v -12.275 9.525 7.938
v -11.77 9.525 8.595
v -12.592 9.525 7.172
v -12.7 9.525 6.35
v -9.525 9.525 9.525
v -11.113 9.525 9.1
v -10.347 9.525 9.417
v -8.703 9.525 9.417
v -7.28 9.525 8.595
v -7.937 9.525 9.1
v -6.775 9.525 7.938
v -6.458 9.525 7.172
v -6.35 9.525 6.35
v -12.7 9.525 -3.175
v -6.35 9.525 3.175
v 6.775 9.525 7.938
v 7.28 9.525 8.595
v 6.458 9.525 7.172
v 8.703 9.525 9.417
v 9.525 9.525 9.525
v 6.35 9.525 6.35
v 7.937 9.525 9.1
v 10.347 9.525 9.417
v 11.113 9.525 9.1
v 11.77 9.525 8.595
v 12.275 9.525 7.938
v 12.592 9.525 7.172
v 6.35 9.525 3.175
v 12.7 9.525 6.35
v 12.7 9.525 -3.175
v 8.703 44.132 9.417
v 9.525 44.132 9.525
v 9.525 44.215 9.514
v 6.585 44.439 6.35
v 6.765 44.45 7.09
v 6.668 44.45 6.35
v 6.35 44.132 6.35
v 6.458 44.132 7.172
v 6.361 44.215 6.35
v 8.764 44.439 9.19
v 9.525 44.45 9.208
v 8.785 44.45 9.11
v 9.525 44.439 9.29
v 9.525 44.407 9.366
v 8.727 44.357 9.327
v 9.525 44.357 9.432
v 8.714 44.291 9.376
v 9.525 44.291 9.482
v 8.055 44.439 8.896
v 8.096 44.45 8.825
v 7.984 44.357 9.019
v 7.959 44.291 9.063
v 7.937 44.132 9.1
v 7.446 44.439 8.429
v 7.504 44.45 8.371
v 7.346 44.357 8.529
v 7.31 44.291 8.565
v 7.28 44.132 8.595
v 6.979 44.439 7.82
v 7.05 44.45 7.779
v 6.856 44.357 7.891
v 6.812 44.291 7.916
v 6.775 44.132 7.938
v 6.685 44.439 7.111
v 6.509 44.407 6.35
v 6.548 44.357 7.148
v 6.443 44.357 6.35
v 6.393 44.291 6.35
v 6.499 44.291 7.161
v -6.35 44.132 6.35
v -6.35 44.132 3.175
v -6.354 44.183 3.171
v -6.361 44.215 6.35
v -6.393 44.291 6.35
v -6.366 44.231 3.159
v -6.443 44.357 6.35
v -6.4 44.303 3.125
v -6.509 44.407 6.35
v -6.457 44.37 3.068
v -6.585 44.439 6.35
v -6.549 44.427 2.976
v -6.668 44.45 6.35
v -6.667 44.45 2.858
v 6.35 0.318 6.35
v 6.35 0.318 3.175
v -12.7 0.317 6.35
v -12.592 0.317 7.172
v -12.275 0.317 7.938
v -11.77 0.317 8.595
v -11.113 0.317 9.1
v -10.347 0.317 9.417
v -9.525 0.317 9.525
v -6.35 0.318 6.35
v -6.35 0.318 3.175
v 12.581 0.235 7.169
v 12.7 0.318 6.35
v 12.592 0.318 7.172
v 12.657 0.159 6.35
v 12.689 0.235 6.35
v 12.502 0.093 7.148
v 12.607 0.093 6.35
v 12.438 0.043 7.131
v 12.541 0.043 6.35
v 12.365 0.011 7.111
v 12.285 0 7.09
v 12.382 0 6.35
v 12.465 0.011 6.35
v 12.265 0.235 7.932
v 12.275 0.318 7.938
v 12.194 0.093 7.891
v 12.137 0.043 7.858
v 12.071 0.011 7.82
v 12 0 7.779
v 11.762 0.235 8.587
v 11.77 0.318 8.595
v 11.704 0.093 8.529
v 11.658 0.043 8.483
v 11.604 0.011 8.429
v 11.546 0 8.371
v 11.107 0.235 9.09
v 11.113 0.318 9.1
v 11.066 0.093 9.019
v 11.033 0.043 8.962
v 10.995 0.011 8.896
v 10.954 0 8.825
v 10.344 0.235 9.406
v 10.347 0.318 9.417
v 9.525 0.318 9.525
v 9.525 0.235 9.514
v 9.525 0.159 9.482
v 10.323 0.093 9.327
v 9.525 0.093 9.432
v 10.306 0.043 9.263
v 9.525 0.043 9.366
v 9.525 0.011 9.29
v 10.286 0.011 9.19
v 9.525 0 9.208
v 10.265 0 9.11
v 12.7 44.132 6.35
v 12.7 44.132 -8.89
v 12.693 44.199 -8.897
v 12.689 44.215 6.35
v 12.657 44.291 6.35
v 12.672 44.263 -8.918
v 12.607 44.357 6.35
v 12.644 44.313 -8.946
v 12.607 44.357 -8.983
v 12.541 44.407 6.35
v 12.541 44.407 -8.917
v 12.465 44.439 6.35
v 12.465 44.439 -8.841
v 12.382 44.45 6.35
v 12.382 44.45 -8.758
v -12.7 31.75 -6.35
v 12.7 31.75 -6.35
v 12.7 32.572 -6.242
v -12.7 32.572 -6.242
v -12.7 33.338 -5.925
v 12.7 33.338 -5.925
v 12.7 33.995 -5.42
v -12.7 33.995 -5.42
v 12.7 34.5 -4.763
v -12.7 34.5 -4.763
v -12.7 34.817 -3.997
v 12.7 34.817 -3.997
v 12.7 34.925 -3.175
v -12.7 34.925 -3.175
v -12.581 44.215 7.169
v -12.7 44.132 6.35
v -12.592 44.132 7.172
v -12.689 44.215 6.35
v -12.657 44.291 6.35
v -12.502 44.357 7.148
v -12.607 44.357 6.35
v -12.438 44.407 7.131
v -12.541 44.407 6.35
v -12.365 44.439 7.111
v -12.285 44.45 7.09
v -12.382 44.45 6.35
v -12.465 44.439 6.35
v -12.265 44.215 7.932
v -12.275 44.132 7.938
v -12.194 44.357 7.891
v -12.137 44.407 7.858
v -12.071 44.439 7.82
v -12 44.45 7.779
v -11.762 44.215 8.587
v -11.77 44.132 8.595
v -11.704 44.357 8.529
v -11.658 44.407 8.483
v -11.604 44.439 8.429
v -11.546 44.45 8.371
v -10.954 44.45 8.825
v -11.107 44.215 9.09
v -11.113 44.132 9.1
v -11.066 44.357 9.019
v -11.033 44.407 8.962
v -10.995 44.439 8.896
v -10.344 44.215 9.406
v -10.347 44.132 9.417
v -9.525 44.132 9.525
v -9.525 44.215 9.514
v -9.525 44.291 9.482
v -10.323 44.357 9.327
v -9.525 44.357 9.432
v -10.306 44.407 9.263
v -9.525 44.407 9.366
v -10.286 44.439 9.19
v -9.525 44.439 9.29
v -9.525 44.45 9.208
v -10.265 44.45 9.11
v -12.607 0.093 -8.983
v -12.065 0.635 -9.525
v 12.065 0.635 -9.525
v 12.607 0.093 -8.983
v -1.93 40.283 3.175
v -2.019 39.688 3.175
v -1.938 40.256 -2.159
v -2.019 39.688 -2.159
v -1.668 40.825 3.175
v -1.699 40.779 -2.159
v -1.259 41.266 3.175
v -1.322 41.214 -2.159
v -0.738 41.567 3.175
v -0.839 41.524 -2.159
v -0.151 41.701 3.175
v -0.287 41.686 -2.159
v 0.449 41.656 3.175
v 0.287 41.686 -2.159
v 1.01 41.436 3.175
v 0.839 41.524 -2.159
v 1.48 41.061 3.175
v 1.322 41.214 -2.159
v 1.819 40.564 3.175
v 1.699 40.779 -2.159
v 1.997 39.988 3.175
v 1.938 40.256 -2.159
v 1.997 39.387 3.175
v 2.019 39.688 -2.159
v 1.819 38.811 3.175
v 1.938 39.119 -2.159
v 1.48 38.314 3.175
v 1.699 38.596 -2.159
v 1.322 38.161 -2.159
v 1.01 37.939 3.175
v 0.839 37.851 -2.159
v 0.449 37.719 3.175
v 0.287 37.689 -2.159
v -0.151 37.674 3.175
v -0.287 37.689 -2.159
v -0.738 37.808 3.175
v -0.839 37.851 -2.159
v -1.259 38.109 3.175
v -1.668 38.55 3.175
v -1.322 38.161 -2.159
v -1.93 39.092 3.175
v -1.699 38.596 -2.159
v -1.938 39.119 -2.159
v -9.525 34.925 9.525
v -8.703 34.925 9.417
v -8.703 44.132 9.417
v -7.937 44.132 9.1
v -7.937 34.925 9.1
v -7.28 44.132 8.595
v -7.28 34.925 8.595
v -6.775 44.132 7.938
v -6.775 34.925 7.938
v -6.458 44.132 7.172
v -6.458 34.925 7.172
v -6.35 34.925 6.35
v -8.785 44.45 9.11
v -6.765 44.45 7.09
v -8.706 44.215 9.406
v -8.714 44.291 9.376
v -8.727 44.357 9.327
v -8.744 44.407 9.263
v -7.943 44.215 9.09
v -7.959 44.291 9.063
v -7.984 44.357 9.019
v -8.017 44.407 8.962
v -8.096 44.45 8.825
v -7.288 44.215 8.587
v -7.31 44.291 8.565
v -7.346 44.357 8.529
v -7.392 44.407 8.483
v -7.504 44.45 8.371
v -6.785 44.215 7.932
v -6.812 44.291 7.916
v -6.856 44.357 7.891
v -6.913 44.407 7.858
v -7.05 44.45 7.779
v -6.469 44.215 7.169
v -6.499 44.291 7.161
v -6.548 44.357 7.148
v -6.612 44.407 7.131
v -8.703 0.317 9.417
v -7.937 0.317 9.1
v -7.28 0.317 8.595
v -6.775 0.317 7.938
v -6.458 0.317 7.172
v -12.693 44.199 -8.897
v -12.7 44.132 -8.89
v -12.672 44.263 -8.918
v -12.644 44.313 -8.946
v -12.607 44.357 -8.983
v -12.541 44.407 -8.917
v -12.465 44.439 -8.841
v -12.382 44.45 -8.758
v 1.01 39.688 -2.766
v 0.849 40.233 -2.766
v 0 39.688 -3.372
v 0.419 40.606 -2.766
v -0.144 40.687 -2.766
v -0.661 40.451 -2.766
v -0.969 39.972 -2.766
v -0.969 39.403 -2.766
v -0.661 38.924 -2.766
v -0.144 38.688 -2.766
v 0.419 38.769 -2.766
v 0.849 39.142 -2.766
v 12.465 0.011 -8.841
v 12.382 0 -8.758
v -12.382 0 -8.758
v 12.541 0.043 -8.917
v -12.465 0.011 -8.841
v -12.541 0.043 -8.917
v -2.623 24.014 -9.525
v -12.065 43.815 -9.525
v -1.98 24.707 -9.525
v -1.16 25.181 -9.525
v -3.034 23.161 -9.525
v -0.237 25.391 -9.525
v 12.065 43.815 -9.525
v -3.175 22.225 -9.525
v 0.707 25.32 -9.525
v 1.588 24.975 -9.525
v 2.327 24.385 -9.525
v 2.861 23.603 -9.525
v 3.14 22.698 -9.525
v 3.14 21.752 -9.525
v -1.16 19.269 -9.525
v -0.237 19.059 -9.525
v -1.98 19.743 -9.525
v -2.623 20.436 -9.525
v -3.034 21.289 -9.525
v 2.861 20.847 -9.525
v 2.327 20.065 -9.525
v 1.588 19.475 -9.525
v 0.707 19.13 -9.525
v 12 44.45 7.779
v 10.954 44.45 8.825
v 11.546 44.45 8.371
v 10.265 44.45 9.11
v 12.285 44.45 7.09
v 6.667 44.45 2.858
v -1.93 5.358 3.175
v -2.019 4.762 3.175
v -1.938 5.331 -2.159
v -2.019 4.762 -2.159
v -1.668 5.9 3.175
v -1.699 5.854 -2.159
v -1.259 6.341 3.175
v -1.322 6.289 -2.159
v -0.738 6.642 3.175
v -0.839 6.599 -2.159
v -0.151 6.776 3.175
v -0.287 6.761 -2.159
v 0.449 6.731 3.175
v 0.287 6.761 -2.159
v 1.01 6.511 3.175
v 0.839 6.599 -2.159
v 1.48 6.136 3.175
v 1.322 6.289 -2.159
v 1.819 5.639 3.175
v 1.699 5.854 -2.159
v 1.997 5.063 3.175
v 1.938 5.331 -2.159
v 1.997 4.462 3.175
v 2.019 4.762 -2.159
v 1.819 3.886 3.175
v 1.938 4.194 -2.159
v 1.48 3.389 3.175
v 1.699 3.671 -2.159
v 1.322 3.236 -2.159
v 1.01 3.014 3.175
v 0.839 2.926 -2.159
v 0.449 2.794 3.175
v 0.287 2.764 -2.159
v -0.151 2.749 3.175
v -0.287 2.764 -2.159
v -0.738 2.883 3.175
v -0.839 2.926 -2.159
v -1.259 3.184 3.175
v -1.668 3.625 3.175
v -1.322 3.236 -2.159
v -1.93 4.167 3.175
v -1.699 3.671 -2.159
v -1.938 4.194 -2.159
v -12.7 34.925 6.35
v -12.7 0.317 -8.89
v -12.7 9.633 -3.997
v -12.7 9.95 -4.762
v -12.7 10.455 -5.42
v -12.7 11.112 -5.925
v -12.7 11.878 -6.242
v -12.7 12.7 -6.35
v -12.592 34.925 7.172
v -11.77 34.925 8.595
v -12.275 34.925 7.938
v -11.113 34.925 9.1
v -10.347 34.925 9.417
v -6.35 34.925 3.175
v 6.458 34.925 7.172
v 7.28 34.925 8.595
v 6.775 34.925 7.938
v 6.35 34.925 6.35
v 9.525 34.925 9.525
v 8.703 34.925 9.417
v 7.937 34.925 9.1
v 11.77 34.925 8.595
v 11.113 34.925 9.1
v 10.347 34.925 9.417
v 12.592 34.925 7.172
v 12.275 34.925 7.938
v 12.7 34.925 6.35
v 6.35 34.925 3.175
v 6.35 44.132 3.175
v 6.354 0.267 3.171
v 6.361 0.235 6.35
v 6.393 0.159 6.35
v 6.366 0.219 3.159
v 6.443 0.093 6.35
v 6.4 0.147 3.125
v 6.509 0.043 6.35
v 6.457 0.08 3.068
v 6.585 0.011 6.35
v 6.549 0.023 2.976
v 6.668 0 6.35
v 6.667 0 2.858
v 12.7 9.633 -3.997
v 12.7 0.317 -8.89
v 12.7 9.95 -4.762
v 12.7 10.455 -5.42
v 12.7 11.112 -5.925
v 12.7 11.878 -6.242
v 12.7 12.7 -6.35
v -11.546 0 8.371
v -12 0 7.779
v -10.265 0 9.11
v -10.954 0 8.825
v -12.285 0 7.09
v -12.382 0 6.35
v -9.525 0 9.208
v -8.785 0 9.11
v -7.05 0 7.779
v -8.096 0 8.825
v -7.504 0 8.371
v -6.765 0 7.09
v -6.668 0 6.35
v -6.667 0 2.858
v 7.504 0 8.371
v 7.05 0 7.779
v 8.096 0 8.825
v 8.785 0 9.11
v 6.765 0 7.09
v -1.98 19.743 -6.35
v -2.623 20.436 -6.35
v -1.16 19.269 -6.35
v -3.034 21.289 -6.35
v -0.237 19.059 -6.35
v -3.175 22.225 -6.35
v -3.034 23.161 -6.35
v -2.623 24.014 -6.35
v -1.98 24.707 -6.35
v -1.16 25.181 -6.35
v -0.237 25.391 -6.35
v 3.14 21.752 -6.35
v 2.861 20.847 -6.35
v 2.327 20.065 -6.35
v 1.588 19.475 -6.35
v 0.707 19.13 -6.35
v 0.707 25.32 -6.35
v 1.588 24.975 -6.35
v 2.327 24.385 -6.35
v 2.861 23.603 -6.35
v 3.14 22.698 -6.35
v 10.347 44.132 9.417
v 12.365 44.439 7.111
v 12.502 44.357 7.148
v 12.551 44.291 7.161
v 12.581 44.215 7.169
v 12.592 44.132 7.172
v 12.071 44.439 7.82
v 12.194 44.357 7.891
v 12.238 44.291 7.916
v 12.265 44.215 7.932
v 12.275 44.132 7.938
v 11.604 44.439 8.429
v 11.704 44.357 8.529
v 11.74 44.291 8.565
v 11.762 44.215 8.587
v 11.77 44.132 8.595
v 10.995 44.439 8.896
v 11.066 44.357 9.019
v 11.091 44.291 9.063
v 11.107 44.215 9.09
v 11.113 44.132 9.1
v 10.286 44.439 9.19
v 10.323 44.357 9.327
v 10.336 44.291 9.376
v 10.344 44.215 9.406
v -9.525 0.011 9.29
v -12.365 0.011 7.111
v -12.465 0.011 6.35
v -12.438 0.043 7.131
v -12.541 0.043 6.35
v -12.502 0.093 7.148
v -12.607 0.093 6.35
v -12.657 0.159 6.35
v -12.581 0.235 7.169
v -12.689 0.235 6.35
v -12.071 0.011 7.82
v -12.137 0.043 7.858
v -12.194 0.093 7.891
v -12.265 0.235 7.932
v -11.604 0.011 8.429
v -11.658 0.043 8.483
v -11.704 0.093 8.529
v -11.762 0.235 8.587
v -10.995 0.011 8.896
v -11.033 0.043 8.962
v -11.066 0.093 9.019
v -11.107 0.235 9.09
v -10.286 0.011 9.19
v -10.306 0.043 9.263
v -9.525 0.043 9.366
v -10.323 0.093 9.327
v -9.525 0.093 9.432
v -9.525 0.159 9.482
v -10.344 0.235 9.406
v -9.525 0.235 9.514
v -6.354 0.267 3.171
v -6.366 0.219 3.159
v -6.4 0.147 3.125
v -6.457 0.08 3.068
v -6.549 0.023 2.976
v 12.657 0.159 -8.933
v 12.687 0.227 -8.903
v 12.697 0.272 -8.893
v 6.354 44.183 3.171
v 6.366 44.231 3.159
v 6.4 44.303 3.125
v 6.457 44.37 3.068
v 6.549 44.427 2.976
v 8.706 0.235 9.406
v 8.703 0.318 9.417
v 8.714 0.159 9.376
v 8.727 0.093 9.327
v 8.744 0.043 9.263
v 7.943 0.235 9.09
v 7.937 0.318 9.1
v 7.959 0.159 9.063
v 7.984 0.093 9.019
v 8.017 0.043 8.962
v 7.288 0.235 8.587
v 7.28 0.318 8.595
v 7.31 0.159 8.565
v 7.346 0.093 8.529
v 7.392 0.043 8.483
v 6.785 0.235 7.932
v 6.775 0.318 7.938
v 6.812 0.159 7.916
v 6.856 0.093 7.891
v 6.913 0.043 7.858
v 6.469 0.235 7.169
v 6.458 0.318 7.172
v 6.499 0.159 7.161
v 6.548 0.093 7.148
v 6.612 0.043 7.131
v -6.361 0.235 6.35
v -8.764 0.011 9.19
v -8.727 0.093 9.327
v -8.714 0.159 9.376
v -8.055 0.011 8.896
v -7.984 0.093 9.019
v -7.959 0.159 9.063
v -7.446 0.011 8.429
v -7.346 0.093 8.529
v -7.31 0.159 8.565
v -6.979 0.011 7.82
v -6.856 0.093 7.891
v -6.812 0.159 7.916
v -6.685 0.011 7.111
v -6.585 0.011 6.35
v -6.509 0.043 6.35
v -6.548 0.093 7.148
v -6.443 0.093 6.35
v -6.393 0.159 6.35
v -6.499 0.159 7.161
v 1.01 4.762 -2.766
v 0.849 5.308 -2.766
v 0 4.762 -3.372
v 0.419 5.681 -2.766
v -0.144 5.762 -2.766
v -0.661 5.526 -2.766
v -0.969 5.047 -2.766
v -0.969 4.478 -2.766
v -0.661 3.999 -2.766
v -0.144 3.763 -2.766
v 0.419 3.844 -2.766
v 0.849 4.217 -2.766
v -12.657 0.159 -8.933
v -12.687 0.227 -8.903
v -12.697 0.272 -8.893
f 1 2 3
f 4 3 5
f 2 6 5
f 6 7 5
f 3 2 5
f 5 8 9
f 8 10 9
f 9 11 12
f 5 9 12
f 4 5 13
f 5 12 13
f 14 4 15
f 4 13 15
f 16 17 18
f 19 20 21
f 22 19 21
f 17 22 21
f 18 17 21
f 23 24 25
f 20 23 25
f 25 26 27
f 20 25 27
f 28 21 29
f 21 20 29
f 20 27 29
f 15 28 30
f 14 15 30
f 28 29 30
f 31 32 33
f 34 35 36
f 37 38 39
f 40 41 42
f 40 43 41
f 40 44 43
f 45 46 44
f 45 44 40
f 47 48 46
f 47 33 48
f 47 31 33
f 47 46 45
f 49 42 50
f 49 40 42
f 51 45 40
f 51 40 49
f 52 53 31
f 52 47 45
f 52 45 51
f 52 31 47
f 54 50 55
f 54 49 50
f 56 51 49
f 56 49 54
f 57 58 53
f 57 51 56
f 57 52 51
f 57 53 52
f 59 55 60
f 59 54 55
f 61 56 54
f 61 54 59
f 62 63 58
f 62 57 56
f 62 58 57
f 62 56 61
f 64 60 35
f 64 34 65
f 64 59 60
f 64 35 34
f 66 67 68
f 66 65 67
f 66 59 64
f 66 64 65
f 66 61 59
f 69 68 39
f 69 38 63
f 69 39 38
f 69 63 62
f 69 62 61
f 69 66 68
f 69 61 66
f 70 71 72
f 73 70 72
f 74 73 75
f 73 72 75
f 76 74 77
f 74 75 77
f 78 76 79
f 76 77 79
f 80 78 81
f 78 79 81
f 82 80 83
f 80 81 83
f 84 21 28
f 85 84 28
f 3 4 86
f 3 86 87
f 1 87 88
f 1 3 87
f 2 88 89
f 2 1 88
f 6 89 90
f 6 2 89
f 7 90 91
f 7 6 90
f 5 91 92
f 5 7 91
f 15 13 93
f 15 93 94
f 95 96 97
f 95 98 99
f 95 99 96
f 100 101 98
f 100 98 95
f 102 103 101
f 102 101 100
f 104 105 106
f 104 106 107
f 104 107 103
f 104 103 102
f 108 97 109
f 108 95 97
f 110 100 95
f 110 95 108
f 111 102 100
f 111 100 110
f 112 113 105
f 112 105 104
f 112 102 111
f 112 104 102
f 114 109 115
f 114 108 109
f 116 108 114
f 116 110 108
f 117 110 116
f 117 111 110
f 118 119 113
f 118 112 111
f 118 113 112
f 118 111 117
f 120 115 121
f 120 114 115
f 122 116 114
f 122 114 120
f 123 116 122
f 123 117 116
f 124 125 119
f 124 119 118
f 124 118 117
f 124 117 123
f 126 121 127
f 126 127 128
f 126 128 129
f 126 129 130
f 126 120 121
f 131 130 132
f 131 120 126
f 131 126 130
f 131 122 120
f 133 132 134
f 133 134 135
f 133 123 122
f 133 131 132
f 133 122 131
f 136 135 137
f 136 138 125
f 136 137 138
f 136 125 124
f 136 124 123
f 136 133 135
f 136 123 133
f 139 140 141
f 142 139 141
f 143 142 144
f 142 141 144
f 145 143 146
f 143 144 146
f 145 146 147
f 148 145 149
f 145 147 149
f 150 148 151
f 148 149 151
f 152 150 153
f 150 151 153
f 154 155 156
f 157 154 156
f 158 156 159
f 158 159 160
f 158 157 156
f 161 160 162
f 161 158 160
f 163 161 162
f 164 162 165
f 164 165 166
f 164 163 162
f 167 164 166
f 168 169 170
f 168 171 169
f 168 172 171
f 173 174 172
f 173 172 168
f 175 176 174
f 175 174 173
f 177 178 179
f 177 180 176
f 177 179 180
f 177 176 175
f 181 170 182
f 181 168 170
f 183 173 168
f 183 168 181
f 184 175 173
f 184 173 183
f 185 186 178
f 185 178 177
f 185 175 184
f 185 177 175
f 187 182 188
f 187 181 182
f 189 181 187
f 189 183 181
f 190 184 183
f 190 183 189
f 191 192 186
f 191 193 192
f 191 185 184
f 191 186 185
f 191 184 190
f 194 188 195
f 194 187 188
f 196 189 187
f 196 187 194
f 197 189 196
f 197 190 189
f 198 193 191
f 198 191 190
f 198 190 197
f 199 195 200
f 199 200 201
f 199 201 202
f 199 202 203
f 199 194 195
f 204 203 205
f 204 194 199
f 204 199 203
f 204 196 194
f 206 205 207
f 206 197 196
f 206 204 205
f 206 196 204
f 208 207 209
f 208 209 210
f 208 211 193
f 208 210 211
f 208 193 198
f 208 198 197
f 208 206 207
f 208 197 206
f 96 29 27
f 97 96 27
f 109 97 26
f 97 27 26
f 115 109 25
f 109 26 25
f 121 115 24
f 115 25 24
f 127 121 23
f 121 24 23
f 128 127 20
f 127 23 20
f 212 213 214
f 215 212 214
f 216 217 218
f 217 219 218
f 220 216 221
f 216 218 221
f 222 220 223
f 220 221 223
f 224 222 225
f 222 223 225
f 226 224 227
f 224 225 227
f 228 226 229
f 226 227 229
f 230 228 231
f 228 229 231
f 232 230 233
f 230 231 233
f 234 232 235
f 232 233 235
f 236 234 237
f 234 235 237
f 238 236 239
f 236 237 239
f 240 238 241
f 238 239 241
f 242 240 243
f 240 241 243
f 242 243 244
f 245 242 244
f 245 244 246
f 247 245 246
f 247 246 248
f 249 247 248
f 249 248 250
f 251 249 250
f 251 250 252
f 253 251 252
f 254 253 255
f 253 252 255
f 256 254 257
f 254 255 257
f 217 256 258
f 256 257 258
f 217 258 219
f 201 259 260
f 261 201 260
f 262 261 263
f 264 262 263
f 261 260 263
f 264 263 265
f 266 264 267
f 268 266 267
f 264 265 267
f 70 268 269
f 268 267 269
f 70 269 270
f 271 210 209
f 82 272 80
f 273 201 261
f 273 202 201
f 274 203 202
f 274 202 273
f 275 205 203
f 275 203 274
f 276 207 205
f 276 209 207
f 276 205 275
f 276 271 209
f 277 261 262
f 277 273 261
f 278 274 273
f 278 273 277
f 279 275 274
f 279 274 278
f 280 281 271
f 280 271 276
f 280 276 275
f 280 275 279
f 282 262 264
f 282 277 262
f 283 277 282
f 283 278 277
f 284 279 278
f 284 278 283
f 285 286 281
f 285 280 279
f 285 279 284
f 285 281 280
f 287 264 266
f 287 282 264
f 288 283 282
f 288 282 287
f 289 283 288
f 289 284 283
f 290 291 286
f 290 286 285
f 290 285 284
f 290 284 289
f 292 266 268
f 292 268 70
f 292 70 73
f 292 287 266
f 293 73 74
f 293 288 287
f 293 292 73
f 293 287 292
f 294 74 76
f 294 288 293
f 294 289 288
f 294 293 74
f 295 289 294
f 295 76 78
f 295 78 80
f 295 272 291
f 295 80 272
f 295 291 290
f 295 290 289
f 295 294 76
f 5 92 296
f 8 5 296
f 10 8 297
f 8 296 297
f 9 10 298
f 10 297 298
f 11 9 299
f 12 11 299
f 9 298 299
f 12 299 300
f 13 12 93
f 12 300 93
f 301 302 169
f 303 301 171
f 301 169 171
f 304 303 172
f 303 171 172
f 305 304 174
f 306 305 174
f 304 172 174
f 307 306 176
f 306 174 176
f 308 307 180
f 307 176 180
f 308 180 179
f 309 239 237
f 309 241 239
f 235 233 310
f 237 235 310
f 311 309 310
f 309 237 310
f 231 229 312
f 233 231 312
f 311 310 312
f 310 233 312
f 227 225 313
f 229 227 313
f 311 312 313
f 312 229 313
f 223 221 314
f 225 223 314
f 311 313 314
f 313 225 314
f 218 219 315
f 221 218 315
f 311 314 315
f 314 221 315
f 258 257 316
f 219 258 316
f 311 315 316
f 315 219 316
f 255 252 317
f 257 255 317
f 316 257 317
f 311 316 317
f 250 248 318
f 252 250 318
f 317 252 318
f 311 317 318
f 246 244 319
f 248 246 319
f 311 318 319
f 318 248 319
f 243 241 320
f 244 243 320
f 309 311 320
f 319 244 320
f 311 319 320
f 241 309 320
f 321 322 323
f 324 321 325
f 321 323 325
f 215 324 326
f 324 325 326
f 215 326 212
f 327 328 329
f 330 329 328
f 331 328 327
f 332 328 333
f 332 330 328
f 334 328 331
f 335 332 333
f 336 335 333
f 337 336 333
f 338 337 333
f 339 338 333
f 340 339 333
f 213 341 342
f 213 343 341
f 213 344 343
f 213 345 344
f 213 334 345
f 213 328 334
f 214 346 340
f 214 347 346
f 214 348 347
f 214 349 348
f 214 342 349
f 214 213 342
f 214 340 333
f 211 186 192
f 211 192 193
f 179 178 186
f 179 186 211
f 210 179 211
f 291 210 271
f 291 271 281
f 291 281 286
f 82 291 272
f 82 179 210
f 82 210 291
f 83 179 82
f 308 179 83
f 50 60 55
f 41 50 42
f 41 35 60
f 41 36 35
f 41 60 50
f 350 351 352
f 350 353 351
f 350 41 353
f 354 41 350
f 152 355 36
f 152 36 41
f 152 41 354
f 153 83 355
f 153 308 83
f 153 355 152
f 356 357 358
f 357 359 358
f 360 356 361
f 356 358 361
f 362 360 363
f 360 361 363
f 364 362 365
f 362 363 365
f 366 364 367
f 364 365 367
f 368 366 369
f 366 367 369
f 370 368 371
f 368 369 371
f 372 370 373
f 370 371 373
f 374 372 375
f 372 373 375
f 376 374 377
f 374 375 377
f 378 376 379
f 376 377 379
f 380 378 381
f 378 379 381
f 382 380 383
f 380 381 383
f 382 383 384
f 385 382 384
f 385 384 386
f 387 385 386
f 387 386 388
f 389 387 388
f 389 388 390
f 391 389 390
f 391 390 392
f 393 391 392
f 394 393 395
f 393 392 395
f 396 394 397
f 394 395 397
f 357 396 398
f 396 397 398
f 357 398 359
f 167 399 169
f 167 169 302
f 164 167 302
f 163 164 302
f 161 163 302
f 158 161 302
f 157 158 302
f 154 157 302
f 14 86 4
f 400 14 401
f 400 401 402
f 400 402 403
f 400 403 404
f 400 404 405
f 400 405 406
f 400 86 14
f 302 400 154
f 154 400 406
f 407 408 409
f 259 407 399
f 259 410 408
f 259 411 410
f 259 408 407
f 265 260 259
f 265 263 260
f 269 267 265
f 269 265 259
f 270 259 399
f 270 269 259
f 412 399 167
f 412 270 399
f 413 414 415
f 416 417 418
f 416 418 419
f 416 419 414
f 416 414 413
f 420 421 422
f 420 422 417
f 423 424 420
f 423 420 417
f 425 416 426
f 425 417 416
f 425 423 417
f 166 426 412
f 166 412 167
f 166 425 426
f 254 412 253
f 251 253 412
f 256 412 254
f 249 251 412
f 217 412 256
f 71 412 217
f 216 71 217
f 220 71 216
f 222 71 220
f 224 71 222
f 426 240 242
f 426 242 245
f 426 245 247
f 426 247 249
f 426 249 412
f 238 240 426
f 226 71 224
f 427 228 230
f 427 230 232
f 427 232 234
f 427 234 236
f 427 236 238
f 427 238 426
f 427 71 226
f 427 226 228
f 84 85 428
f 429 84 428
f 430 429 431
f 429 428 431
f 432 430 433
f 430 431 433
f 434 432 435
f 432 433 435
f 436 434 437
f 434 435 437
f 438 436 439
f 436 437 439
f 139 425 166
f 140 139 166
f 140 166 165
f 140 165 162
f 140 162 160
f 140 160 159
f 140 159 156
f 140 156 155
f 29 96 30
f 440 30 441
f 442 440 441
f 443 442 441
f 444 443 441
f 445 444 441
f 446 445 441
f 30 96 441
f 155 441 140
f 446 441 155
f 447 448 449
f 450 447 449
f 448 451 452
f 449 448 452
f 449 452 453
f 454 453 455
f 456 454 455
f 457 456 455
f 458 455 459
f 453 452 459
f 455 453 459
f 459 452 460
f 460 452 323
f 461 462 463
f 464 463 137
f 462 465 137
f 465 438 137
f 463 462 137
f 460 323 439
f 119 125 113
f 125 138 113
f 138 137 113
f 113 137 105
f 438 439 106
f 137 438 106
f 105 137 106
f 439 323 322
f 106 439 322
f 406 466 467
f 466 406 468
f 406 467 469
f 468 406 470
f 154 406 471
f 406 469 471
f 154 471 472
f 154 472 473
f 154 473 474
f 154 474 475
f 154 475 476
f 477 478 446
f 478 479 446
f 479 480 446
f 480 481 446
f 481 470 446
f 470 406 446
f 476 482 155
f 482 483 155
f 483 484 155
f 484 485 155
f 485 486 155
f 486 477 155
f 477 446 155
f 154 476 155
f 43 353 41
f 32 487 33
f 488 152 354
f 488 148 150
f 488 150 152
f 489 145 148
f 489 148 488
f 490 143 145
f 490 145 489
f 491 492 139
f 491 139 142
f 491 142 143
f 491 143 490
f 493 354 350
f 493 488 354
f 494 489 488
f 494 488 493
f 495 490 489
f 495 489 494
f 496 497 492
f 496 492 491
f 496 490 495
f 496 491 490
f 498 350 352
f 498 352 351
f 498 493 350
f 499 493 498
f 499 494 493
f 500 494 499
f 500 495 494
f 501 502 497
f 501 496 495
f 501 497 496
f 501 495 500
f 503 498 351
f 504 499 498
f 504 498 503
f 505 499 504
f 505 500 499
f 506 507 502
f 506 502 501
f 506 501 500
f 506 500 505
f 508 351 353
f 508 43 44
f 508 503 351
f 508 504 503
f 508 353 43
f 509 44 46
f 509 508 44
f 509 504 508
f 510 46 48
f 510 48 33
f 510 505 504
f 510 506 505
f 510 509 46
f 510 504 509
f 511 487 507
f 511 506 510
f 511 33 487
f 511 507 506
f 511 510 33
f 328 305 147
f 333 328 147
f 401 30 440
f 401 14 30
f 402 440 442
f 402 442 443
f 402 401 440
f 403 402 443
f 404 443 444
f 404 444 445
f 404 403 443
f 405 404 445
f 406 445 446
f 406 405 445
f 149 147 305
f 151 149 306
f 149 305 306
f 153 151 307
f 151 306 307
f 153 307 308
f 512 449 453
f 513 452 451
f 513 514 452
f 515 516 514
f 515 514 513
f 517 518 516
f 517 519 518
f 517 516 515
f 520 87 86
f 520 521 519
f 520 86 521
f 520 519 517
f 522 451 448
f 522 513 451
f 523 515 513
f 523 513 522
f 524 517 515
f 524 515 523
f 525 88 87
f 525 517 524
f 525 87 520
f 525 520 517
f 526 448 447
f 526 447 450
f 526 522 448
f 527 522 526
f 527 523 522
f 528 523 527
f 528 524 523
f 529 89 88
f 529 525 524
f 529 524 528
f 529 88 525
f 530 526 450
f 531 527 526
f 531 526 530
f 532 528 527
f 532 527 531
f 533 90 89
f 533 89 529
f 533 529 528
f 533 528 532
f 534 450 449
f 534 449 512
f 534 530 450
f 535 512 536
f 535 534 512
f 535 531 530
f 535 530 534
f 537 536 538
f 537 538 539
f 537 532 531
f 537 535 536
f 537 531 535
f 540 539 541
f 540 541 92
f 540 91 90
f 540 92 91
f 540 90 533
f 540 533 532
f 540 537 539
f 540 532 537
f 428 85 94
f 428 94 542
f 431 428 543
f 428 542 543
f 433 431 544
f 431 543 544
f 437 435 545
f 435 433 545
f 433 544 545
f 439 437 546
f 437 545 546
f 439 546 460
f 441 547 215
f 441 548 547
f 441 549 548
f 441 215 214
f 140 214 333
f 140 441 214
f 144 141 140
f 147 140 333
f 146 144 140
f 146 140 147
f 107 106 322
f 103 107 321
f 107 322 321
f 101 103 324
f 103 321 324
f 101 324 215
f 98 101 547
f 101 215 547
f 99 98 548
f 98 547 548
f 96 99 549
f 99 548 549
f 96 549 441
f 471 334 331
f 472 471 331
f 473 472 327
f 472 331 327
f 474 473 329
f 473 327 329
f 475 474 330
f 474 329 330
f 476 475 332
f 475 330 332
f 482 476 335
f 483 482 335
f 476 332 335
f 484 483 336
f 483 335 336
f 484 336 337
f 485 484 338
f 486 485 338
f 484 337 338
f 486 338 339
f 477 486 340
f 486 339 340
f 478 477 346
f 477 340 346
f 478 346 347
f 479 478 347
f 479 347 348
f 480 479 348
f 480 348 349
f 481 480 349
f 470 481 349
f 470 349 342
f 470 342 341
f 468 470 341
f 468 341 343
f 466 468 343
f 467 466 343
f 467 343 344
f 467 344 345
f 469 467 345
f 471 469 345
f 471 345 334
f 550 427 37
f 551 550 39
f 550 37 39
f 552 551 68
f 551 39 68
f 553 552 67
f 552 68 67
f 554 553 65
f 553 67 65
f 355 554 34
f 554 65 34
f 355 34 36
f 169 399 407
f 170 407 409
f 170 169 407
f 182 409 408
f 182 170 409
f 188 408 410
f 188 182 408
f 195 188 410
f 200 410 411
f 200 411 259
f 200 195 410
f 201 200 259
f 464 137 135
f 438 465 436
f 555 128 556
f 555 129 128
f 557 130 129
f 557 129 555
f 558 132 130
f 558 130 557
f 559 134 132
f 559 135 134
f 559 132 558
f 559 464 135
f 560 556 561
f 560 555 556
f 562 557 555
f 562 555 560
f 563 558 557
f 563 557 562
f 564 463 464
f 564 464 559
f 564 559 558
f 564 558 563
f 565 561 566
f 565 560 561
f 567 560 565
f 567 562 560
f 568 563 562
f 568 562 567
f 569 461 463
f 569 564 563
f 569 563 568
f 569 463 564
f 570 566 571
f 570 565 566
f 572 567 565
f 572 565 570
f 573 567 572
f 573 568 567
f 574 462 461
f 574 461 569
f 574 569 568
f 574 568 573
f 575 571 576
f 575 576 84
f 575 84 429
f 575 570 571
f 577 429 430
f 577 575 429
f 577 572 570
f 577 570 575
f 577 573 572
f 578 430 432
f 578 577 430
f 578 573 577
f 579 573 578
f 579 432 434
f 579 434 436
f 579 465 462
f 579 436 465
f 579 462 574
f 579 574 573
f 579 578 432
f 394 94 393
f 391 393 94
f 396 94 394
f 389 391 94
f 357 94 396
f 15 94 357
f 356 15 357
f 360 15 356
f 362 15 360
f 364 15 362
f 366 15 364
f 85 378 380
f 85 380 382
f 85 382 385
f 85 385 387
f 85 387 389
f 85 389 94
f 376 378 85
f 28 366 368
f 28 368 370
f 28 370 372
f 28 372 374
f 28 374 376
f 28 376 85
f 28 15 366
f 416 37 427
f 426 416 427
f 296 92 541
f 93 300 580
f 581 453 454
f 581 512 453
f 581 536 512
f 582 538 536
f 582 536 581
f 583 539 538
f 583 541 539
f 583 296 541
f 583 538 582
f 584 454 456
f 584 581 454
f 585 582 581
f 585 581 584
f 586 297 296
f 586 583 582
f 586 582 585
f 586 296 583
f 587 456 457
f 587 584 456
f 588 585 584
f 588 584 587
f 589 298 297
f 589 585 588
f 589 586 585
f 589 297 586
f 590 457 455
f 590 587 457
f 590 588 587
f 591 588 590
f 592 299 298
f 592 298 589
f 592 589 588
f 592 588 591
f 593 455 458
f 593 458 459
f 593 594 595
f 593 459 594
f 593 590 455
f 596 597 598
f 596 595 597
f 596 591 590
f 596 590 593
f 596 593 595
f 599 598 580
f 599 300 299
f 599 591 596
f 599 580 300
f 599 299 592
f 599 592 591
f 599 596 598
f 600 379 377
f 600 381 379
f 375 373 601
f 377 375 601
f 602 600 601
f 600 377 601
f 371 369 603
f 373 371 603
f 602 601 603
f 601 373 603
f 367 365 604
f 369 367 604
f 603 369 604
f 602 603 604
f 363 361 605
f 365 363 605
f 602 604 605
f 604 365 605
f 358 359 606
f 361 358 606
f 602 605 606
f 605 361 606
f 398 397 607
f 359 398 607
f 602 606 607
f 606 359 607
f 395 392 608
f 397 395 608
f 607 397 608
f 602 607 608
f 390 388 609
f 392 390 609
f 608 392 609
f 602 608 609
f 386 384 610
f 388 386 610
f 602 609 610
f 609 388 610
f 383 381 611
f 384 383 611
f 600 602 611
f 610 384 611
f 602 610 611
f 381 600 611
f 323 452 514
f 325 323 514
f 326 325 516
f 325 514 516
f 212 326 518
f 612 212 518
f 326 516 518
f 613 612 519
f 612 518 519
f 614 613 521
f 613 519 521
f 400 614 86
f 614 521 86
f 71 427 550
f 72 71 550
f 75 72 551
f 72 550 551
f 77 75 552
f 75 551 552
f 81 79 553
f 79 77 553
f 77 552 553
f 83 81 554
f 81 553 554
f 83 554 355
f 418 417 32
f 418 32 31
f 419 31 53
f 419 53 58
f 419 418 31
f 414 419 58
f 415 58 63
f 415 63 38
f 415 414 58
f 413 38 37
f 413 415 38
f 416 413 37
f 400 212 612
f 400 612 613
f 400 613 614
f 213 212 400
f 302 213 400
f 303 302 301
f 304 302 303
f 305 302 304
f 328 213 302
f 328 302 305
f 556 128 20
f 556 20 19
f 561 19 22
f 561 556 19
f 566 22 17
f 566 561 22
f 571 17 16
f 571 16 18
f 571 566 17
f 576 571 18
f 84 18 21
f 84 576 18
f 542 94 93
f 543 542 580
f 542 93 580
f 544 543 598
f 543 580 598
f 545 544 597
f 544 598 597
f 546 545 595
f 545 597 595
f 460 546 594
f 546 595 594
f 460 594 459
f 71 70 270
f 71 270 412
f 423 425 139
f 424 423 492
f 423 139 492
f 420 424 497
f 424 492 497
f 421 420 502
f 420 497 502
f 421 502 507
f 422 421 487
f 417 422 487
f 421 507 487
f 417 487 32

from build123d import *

# Parameters (mm, degrees)
SKETCH1_W                       = 25.4
SKETCH1_H                       = 19.05
BOSS_EXTRUDE1_DEPTH             = 44.45
SKETCH2_W                       = 25.4
SKETCH2_H                       = 15.875
CUT_EXTRUDE4_DEPTH              = 38.162422217
SKETCH3_W                       = 12.7
SKETCH3_H                       = 6.35
CUT_EXTRUDE5_DEPTH              = 50.8
FILLET1_R                       = 3.175
F_10_32_TAPPED_HOLE1_D          = 4.0386
F_10_32_TAPPED_HOLE1_DEPTH      = 5.334
F_10_32_TAPPED_HOLE1_TIP        = 1.213317848
CHAMFER1_SIZE                   = 0.635
F_1_4_0_25_DIAMETER_HOLE1_D     = 6.35
F_1_4_0_25_DIAMETER_HOLE1_DEPTH = 31.242
F_1_4_0_25_DIAMETER_HOLE1_TIP   = 1.907732465
FILLET2_R                       = 0.3175
FILLET3_R                       = 3.175


# Some blends are built 0.0001 mm under size
with BuildPart() as part:
    # Sketch1 → Boss-Extrude1 (new body)
    with BuildSketch(Plane(origin=(0, 0, 0), x_dir=(1, 0, 0), z_dir=(0, 1, 0))):
        Rectangle(SKETCH1_W, SKETCH1_H)
    extrude(amount=BOSS_EXTRUDE1_DEPTH)

    # Sketch2 → Cut-Extrude4 (cut, through all)
    with BuildSketch(Plane(origin=(12.7, 25.4, 0), x_dir=(0, 1, 0), z_dir=(-1, 0, 0))):
        with Locations((-3.175, -1.5875)):
            Rectangle(SKETCH2_W, SKETCH2_H)
    extrude(amount=CUT_EXTRUDE4_DEPTH, mode=Mode.SUBTRACT)

    # Sketch3 → Cut-Extrude5 (cut)
    with BuildSketch(Plane(origin=(0, 44.45, 0), x_dir=(1, 0, 0), z_dir=(0, 1, 0))):
        with Locations((0, -6.35)):
            Rectangle(SKETCH3_W, SKETCH3_H)
    extrude(amount=-CUT_EXTRUDE5_DEPTH, mode=Mode.SUBTRACT)

    # Fillet1
    fillet1_edges = [part.edges().sort_by_distance(p)[0] for p in [
        (-12.7, 39.6875, 9.525),
        (-12.7, 4.7625, 9.525),
        (-6.35, 4.7625, 9.525),
        (12.7, 4.7625, 9.525),
        (6.35, 4.7625, 9.525),
        (12.7, 39.6875, 9.525),
        (6.35, 39.6875, 9.525),
        (-6.35, 39.6875, 9.525),
    ]]
    fillet(fillet1_edges, radius=FILLET1_R - 0.0001)  # a hair under: the kernel refuses the full size

    # #10-32 Tapped Hole1
    with Locations(Plane.XY.offset(3.175)):
        with Locations((0, 39.6875), (0, 4.7625)):
            Hole(F_10_32_TAPPED_HOLE1_D / 2, depth=F_10_32_TAPPED_HOLE1_DEPTH)
            with Locations((0, 0, -(F_10_32_TAPPED_HOLE1_DEPTH + F_10_32_TAPPED_HOLE1_TIP / 2))):  # 118° drill point
                Cone(0, F_10_32_TAPPED_HOLE1_D / 2, F_10_32_TAPPED_HOLE1_TIP, mode=Mode.SUBTRACT)

    # Chamfer1
    chamfer1_edges = [part.edges().sort_by_distance(p)[0] for p in [
        (0, 0, -9.525),
        (0, 44.45, -9.525),
        (-12.7, 22.225, -9.525),
        (12.7, 22.225, -9.525),
    ]]
    chamfer(chamfer1_edges, length=CHAMFER1_SIZE)

    # 1/4 (0.25) Diameter Hole1
    with Locations(Plane.XY.offset(-6.35)):
        with Locations((0, 22.225)):
            Hole(F_1_4_0_25_DIAMETER_HOLE1_D / 2, depth=F_1_4_0_25_DIAMETER_HOLE1_DEPTH)
            with Locations((0, 0, -(F_1_4_0_25_DIAMETER_HOLE1_DEPTH + F_1_4_0_25_DIAMETER_HOLE1_TIP / 2))):  # 118° drill point
                Cone(0, F_1_4_0_25_DIAMETER_HOLE1_D / 2, F_1_4_0_25_DIAMETER_HOLE1_TIP, mode=Mode.SUBTRACT)

    # Fillet2
    # the kernel refuses this fillet: 0.3175 mm, written as the material it takes off along each edge
    with BuildSketch(Plane(origin=(-12.7, 44.45, 6.3501), x_dir=(0, -1, 0), z_dir=(0, 0, -1)), Plane(origin=(12.7, 0, -9.68375), x_dir=(-1, 0, 0), z_dir=(0, 0, 1))) as fillet2_piece_1:
        with BuildLine():
            CenterArc((FILLET2_R, -FILLET2_R), FILLET2_R, 90, 90)
            Line((0, -FILLET2_R), (0, 0))
            Line((0, 0), (FILLET2_R, 0))
        make_face()
    extrude(amount=16.03385, mode=Mode.SUBTRACT)
    with BuildSketch(Plane(origin=(-13.028782015, 44.45, -8.89), x_dir=(0, 0, 1), z_dir=(1, 0, 0))) as fillet2_piece_2:
        with BuildLine():
            CenterArc((FILLET2_R * 0.414213562373, FILLET2_R), FILLET2_R, 225, 45)
            Line((-FILLET2_R * 0.292893218813, FILLET2_R * 0.292893218813), (0, 0))
            Line((0, 0), (FILLET2_R * 0.414213562373, 0))
        make_face()
    extrude(amount=26.05756403, mode=Mode.SUBTRACT)
    with BuildSketch(Plane(origin=(-12.7, 0, 6.3501), x_dir=(0, 1, 0), z_dir=(0, 0, -1)), Plane(origin=(12.7, 44.45, -9.68375), x_dir=(-1, 0, 0), z_dir=(0, 0, 1))) as fillet2_piece_3:
        with BuildLine():
            CenterArc((FILLET2_R, FILLET2_R), FILLET2_R, 180, 90)
            Line((0, FILLET2_R), (0, 0))
            Line((0, 0), (FILLET2_R, 0))
        make_face()
    extrude(amount=16.03385, mode=Mode.SUBTRACT)
    with BuildSketch(Plane(origin=(-13.028782015, 0, -8.89), x_dir=(0, 0, 1), z_dir=(1, 0, 0))) as fillet2_piece_4:
        with BuildLine():
            CenterArc((FILLET2_R * 0.414213562373, -FILLET2_R), FILLET2_R, 90, 45)
            Line((-FILLET2_R * 0.292893218813, -FILLET2_R * 0.292893218813), (0, 0))
            Line((0, 0), (FILLET2_R * 0.414213562373, 0))
        make_face()
    extrude(amount=26.05756403, mode=Mode.SUBTRACT)
    with BuildSketch(Plane(origin=(-6.35, 0, 6.3501), x_dir=(-1, 0, 0), z_dir=(0, 0, -1)), Plane(origin=(-6.35, 44.45, 3.175), x_dir=(-1, 0, 0), z_dir=(0, 0, 1)), Plane(origin=(6.35, 0, 3.175), x_dir=(1, 0, 0), z_dir=(0, 0, 1)), Plane(origin=(6.35, 44.45, 6.3501), x_dir=(1, 0, 0), z_dir=(0, 0, -1))) as fillet2_piece_5:
        with BuildLine():
            CenterArc((FILLET2_R, FILLET2_R), FILLET2_R, 180, 90)
            Line((0, FILLET2_R), (0, 0))
            Line((0, 0), (FILLET2_R, 0))
        make_face()
    extrude(amount=3.1751, mode=Mode.SUBTRACT)
    with BuildSketch(Plane(origin=(-6.35, 0, 3.175), x_dir=(0, 0, -1), z_dir=(1, 0, 0)), Plane(origin=(6.35, 44.45, 3.175), x_dir=(0, 0, -1), z_dir=(-1, 0, 0))) as fillet2_piece_6:
        with BuildLine():
            CenterArc((FILLET2_R, FILLET2_R), FILLET2_R, 180, 90)
            Line((0, FILLET2_R), (0, 0))
            Line((0, 0), (FILLET2_R, 0))
        make_face()
    extrude(amount=12.7, mode=Mode.SUBTRACT)
    with BuildSketch(Plane(origin=(9.5249, 0, 6.3501), x_dir=(0, 0, 1), z_dir=(1, 0, 0))) as fillet2_piece_7:
        with BuildLine():
            CenterArc((3.1749 - FILLET2_R, -FILLET2_R), FILLET2_R, 360, 90)
            Line((3.1749, -FILLET2_R), (3.1749, 0))
            Line((3.1749, 0), (3.1749 - FILLET2_R, 0))
        make_face()
    revolve(axis=Axis((9.5249, 0, 6.3501), (0, -1, 0)), revolution_arc=90, mode=Mode.SUBTRACT)
    with BuildSketch(Plane(origin=(9.5251, 0, 6.3501), x_dir=(1, 0, 0), z_dir=(0, 0, -1))) as fillet2_piece_8:
        with BuildLine():
            CenterArc((3.1749 - FILLET2_R, -FILLET2_R), FILLET2_R, 0, 90)
            Line((3.1749, -FILLET2_R), (3.1749, 0))
            Line((3.1749, 0), (3.1749 - FILLET2_R, 0))
        make_face()
    revolve(axis=Axis((9.5251, 0, 6.3501), (0, -1, 0)), revolution_arc=90, mode=Mode.SUBTRACT)
    with BuildSketch(Plane(origin=(-9.5249, 0, 6.3501), x_dir=(0, 0, 1), z_dir=(-1, 0, 0))) as fillet2_piece_9:
        with BuildLine():
            CenterArc((3.1749 - FILLET2_R, FILLET2_R), FILLET2_R, 270, 90)
            Line((3.1749, FILLET2_R), (3.1749, 0))
            Line((3.1749, 0), (3.1749 - FILLET2_R, 0))
        make_face()
    revolve(axis=Axis((-9.5249, 0, 6.3501), (0, 1, 0)), revolution_arc=90, mode=Mode.SUBTRACT)
    with BuildSketch(Plane(origin=(-9.5251, 0, 6.3501), x_dir=(-1, 0, 0), z_dir=(0, 0, -1))) as fillet2_piece_10:
        with BuildLine():
            CenterArc((3.1749 - FILLET2_R, FILLET2_R), FILLET2_R, 270, 90)
            Line((3.1749, FILLET2_R), (3.1749, 0))
            Line((3.1749, 0), (3.1749 - FILLET2_R, 0))
        make_face()
    revolve(axis=Axis((-9.5251, 0, 6.3501), (0, 1, 0)), revolution_arc=90, mode=Mode.SUBTRACT)
    with BuildSketch(Plane(origin=(-9.5251, 44.45, 6.3501), x_dir=(-1, 0, 0), z_dir=(0, 0, -1))) as fillet2_piece_11:
        with BuildLine():
            CenterArc((3.1749 - FILLET2_R, -FILLET2_R), FILLET2_R, 0, 90)
            Line((3.1749, -FILLET2_R), (3.1749, 0))
            Line((3.1749, 0), (3.1749 - FILLET2_R, 0))
        make_face()
    revolve(axis=Axis((-9.5251, 44.45, 6.3501), (0, 1, 0)), revolution_arc=90, mode=Mode.SUBTRACT)
    with BuildSketch(Plane(origin=(-9.5249, 44.45, 6.3501), x_dir=(0, 0, 1), z_dir=(-1, 0, 0))) as fillet2_piece_12:
        with BuildLine():
            CenterArc((3.1749 - FILLET2_R, -FILLET2_R), FILLET2_R, 0, 90)
            Line((3.1749, -FILLET2_R), (3.1749, 0))
            Line((3.1749, 0), (3.1749 - FILLET2_R, 0))
        make_face()
    revolve(axis=Axis((-9.5249, 44.45, 6.3501), (0, 1, 0)), revolution_arc=90, mode=Mode.SUBTRACT)
    with BuildSketch(Plane(origin=(9.5249, 44.45, 6.3501), x_dir=(0, 0, 1), z_dir=(1, 0, 0))) as fillet2_piece_13:
        with BuildLine():
            CenterArc((3.1749 - FILLET2_R, FILLET2_R), FILLET2_R, 270, 90)
            Line((3.1749, FILLET2_R), (3.1749, 0))
            Line((3.1749, 0), (3.1749 - FILLET2_R, 0))
        make_face()
    revolve(axis=Axis((9.5249, 44.45, 6.3501), (0, -1, 0)), revolution_arc=90, mode=Mode.SUBTRACT)
    with BuildSketch(Plane(origin=(9.5251, 44.45, 6.3501), x_dir=(1, 0, 0), z_dir=(0, 0, -1))) as fillet2_piece_14:
        with BuildLine():
            CenterArc((3.1749 - FILLET2_R, FILLET2_R), FILLET2_R, 270, 90)
            Line((3.1749, FILLET2_R), (3.1749, 0))
            Line((3.1749, 0), (3.1749 - FILLET2_R, 0))
        make_face()
    revolve(axis=Axis((9.5251, 44.45, 6.3501), (0, -1, 0)), revolution_arc=90, mode=Mode.SUBTRACT)
    with BuildSketch(Plane(origin=(9.5251, 44.45, 9.525), x_dir=(0, 0, -1), z_dir=(-1, 0, 0)), Plane(origin=(-9.5249, 44.45, 9.525), x_dir=(0, 0, -1), z_dir=(-1, 0, 0))) as fillet2_piece_15:
        with BuildLine():
            CenterArc((FILLET2_R, FILLET2_R), FILLET2_R, 180, 90)
            Line((0, FILLET2_R), (0, 0))
            Line((0, 0), (FILLET2_R, 0))
        make_face()
    extrude(amount=0.0002, mode=Mode.SUBTRACT)
    with BuildSketch(Plane(origin=(-9.5249, 0, 9.525), x_dir=(0, 0, -1), z_dir=(-1, 0, 0)), Plane(origin=(9.5251, 0, 9.525), x_dir=(0, 0, -1), z_dir=(-1, 0, 0))) as fillet2_piece_16:
        with BuildLine():
            CenterArc((FILLET2_R, -FILLET2_R), FILLET2_R, 90, 90)
            Line((0, -FILLET2_R), (0, 0))
            Line((0, 0), (FILLET2_R, 0))
        make_face()
    extrude(amount=0.0002, mode=Mode.SUBTRACT)
    with BuildSketch(Plane(origin=(-6.35, 0, 6.3501), x_dir=(-1, 0, 0), z_dir=(0, 0, -1))) as fillet2_piece_17a_section:
        with BuildLine():
            CenterArc((FILLET2_R, FILLET2_R), FILLET2_R, 180, 90)
            Line((0, FILLET2_R), (0, 0))
            Line((0, 0), (FILLET2_R, 0))
        make_face()
    fillet2_piece_17a = extrude(amount=3.96885, mode=Mode.PRIVATE)
    fillet2_piece_17a = split(fillet2_piece_17a, bisect_by=Plane(origin=(-6.421880449, 0.071880449, 3.175), z_dir=(0, 0, -1)), keep=Keep.TOP, mode=Mode.PRIVATE)
    with BuildSketch(Plane(origin=(-7.14375, 0, 3.175), x_dir=(0, 0, -1), z_dir=(1, 0, 0))) as fillet2_piece_17b_section:
        with BuildLine():
            CenterArc((FILLET2_R, FILLET2_R), FILLET2_R, 180, 90)
            Line((0, FILLET2_R), (0, 0))
            Line((0, 0), (FILLET2_R, 0))
        make_face()
    fillet2_piece_17b = extrude(amount=13.49375, mode=Mode.PRIVATE)
    fillet2_piece_17b = split(fillet2_piece_17b, bisect_by=Plane(origin=(-6.35, 0.071880449, 3.103119551), z_dir=(-1, 0, 0)), keep=Keep.TOP, mode=Mode.PRIVATE)
    fillet2_piece_17 = fillet2_piece_17a & fillet2_piece_17b
    add(fillet2_piece_17, mode=Mode.SUBTRACT)
    with BuildSketch(Plane(origin=(-6.35, 0, 3.175), x_dir=(0, 0, -1), z_dir=(1, 0, 0))) as fillet2_piece_18a_section:
        with BuildLine():
            CenterArc((FILLET2_R, FILLET2_R), FILLET2_R, 180, 90)
            Line((0, FILLET2_R), (0, 0))
            Line((0, 0), (FILLET2_R, 0))
        make_face()
    fillet2_piece_18a = extrude(amount=13.49375, mode=Mode.PRIVATE)
    fillet2_piece_18a = split(fillet2_piece_18a, bisect_by=Plane(origin=(6.35, 0.071880449, 3.103119551), z_dir=(1, 0, 0)), keep=Keep.TOP, mode=Mode.PRIVATE)
    with BuildSketch(Plane(origin=(6.35, 0, 2.38125), x_dir=(1, 0, 0), z_dir=(0, 0, 1))) as fillet2_piece_18b_section:
        with BuildLine():
            CenterArc((FILLET2_R, FILLET2_R), FILLET2_R, 180, 90)
            Line((0, FILLET2_R), (0, 0))
            Line((0, 0), (FILLET2_R, 0))
        make_face()
    fillet2_piece_18b = extrude(amount=3.96885, mode=Mode.PRIVATE)
    fillet2_piece_18b = split(fillet2_piece_18b, bisect_by=Plane(origin=(6.421880449, 0.071880449, 3.175), z_dir=(0, 0, -1)), keep=Keep.TOP, mode=Mode.PRIVATE)
    fillet2_piece_18 = fillet2_piece_18a & fillet2_piece_18b
    add(fillet2_piece_18, mode=Mode.SUBTRACT)
    with BuildSketch(Plane(origin=(-6.35, 44.45, 2.38125), x_dir=(-1, 0, 0), z_dir=(0, 0, 1))) as fillet2_piece_19a_section:
        with BuildLine():
            CenterArc((FILLET2_R, FILLET2_R), FILLET2_R, 180, 90)
            Line((0, FILLET2_R), (0, 0))
            Line((0, 0), (FILLET2_R, 0))
        make_face()
    fillet2_piece_19a = extrude(amount=3.96885, mode=Mode.PRIVATE)
    fillet2_piece_19a = split(fillet2_piece_19a, bisect_by=Plane(origin=(-6.421880449, 44.378119551, 3.175), z_dir=(0, 0, -1)), keep=Keep.TOP, mode=Mode.PRIVATE)
    with BuildSketch(Plane(origin=(6.35, 44.45, 3.175), x_dir=(0, 0, -1), z_dir=(-1, 0, 0))) as fillet2_piece_19b_section:
        with BuildLine():
            CenterArc((FILLET2_R, FILLET2_R), FILLET2_R, 180, 90)
            Line((0, FILLET2_R), (0, 0))
            Line((0, 0), (FILLET2_R, 0))
        make_face()
    fillet2_piece_19b = extrude(amount=13.49375, mode=Mode.PRIVATE)
    fillet2_piece_19b = split(fillet2_piece_19b, bisect_by=Plane(origin=(-6.35, 44.378119551, 3.103119551), z_dir=(-1, 0, 0)), keep=Keep.TOP, mode=Mode.PRIVATE)
    fillet2_piece_19 = fillet2_piece_19a & fillet2_piece_19b
    add(fillet2_piece_19, mode=Mode.SUBTRACT)
    with BuildSketch(Plane(origin=(7.14375, 44.45, 3.175), x_dir=(0, 0, -1), z_dir=(-1, 0, 0))) as fillet2_piece_20a_section:
        with BuildLine():
            CenterArc((FILLET2_R, FILLET2_R), FILLET2_R, 180, 90)
            Line((0, FILLET2_R), (0, 0))
            Line((0, 0), (FILLET2_R, 0))
        make_face()
    fillet2_piece_20a = extrude(amount=13.49375, mode=Mode.PRIVATE)
    fillet2_piece_20a = split(fillet2_piece_20a, bisect_by=Plane(origin=(6.35, 44.378119551, 3.103119551), z_dir=(1, 0, 0)), keep=Keep.TOP, mode=Mode.PRIVATE)
    with BuildSketch(Plane(origin=(6.35, 44.45, 6.3501), x_dir=(1, 0, 0), z_dir=(0, 0, -1))) as fillet2_piece_20b_section:
        with BuildLine():
            CenterArc((FILLET2_R, FILLET2_R), FILLET2_R, 180, 90)
            Line((0, FILLET2_R), (0, 0))
            Line((0, 0), (FILLET2_R, 0))
        make_face()
    fillet2_piece_20b = extrude(amount=3.96885, mode=Mode.PRIVATE)
    fillet2_piece_20b = split(fillet2_piece_20b, bisect_by=Plane(origin=(6.421880449, 44.378119551, 3.175), z_dir=(0, 0, -1)), keep=Keep.TOP, mode=Mode.PRIVATE)
    fillet2_piece_20 = fillet2_piece_20a & fillet2_piece_20b
    add(fillet2_piece_20, mode=Mode.SUBTRACT)

    # Fillet3
    fillet3_edges = [part.edges().sort_by_distance(p)[0] for p in [
        (0, 9.525, -6.35),
        (0, 34.925, -6.35),
    ]]
    fillet(fillet3_edges, radius=FILLET3_R)


solid = part.part
